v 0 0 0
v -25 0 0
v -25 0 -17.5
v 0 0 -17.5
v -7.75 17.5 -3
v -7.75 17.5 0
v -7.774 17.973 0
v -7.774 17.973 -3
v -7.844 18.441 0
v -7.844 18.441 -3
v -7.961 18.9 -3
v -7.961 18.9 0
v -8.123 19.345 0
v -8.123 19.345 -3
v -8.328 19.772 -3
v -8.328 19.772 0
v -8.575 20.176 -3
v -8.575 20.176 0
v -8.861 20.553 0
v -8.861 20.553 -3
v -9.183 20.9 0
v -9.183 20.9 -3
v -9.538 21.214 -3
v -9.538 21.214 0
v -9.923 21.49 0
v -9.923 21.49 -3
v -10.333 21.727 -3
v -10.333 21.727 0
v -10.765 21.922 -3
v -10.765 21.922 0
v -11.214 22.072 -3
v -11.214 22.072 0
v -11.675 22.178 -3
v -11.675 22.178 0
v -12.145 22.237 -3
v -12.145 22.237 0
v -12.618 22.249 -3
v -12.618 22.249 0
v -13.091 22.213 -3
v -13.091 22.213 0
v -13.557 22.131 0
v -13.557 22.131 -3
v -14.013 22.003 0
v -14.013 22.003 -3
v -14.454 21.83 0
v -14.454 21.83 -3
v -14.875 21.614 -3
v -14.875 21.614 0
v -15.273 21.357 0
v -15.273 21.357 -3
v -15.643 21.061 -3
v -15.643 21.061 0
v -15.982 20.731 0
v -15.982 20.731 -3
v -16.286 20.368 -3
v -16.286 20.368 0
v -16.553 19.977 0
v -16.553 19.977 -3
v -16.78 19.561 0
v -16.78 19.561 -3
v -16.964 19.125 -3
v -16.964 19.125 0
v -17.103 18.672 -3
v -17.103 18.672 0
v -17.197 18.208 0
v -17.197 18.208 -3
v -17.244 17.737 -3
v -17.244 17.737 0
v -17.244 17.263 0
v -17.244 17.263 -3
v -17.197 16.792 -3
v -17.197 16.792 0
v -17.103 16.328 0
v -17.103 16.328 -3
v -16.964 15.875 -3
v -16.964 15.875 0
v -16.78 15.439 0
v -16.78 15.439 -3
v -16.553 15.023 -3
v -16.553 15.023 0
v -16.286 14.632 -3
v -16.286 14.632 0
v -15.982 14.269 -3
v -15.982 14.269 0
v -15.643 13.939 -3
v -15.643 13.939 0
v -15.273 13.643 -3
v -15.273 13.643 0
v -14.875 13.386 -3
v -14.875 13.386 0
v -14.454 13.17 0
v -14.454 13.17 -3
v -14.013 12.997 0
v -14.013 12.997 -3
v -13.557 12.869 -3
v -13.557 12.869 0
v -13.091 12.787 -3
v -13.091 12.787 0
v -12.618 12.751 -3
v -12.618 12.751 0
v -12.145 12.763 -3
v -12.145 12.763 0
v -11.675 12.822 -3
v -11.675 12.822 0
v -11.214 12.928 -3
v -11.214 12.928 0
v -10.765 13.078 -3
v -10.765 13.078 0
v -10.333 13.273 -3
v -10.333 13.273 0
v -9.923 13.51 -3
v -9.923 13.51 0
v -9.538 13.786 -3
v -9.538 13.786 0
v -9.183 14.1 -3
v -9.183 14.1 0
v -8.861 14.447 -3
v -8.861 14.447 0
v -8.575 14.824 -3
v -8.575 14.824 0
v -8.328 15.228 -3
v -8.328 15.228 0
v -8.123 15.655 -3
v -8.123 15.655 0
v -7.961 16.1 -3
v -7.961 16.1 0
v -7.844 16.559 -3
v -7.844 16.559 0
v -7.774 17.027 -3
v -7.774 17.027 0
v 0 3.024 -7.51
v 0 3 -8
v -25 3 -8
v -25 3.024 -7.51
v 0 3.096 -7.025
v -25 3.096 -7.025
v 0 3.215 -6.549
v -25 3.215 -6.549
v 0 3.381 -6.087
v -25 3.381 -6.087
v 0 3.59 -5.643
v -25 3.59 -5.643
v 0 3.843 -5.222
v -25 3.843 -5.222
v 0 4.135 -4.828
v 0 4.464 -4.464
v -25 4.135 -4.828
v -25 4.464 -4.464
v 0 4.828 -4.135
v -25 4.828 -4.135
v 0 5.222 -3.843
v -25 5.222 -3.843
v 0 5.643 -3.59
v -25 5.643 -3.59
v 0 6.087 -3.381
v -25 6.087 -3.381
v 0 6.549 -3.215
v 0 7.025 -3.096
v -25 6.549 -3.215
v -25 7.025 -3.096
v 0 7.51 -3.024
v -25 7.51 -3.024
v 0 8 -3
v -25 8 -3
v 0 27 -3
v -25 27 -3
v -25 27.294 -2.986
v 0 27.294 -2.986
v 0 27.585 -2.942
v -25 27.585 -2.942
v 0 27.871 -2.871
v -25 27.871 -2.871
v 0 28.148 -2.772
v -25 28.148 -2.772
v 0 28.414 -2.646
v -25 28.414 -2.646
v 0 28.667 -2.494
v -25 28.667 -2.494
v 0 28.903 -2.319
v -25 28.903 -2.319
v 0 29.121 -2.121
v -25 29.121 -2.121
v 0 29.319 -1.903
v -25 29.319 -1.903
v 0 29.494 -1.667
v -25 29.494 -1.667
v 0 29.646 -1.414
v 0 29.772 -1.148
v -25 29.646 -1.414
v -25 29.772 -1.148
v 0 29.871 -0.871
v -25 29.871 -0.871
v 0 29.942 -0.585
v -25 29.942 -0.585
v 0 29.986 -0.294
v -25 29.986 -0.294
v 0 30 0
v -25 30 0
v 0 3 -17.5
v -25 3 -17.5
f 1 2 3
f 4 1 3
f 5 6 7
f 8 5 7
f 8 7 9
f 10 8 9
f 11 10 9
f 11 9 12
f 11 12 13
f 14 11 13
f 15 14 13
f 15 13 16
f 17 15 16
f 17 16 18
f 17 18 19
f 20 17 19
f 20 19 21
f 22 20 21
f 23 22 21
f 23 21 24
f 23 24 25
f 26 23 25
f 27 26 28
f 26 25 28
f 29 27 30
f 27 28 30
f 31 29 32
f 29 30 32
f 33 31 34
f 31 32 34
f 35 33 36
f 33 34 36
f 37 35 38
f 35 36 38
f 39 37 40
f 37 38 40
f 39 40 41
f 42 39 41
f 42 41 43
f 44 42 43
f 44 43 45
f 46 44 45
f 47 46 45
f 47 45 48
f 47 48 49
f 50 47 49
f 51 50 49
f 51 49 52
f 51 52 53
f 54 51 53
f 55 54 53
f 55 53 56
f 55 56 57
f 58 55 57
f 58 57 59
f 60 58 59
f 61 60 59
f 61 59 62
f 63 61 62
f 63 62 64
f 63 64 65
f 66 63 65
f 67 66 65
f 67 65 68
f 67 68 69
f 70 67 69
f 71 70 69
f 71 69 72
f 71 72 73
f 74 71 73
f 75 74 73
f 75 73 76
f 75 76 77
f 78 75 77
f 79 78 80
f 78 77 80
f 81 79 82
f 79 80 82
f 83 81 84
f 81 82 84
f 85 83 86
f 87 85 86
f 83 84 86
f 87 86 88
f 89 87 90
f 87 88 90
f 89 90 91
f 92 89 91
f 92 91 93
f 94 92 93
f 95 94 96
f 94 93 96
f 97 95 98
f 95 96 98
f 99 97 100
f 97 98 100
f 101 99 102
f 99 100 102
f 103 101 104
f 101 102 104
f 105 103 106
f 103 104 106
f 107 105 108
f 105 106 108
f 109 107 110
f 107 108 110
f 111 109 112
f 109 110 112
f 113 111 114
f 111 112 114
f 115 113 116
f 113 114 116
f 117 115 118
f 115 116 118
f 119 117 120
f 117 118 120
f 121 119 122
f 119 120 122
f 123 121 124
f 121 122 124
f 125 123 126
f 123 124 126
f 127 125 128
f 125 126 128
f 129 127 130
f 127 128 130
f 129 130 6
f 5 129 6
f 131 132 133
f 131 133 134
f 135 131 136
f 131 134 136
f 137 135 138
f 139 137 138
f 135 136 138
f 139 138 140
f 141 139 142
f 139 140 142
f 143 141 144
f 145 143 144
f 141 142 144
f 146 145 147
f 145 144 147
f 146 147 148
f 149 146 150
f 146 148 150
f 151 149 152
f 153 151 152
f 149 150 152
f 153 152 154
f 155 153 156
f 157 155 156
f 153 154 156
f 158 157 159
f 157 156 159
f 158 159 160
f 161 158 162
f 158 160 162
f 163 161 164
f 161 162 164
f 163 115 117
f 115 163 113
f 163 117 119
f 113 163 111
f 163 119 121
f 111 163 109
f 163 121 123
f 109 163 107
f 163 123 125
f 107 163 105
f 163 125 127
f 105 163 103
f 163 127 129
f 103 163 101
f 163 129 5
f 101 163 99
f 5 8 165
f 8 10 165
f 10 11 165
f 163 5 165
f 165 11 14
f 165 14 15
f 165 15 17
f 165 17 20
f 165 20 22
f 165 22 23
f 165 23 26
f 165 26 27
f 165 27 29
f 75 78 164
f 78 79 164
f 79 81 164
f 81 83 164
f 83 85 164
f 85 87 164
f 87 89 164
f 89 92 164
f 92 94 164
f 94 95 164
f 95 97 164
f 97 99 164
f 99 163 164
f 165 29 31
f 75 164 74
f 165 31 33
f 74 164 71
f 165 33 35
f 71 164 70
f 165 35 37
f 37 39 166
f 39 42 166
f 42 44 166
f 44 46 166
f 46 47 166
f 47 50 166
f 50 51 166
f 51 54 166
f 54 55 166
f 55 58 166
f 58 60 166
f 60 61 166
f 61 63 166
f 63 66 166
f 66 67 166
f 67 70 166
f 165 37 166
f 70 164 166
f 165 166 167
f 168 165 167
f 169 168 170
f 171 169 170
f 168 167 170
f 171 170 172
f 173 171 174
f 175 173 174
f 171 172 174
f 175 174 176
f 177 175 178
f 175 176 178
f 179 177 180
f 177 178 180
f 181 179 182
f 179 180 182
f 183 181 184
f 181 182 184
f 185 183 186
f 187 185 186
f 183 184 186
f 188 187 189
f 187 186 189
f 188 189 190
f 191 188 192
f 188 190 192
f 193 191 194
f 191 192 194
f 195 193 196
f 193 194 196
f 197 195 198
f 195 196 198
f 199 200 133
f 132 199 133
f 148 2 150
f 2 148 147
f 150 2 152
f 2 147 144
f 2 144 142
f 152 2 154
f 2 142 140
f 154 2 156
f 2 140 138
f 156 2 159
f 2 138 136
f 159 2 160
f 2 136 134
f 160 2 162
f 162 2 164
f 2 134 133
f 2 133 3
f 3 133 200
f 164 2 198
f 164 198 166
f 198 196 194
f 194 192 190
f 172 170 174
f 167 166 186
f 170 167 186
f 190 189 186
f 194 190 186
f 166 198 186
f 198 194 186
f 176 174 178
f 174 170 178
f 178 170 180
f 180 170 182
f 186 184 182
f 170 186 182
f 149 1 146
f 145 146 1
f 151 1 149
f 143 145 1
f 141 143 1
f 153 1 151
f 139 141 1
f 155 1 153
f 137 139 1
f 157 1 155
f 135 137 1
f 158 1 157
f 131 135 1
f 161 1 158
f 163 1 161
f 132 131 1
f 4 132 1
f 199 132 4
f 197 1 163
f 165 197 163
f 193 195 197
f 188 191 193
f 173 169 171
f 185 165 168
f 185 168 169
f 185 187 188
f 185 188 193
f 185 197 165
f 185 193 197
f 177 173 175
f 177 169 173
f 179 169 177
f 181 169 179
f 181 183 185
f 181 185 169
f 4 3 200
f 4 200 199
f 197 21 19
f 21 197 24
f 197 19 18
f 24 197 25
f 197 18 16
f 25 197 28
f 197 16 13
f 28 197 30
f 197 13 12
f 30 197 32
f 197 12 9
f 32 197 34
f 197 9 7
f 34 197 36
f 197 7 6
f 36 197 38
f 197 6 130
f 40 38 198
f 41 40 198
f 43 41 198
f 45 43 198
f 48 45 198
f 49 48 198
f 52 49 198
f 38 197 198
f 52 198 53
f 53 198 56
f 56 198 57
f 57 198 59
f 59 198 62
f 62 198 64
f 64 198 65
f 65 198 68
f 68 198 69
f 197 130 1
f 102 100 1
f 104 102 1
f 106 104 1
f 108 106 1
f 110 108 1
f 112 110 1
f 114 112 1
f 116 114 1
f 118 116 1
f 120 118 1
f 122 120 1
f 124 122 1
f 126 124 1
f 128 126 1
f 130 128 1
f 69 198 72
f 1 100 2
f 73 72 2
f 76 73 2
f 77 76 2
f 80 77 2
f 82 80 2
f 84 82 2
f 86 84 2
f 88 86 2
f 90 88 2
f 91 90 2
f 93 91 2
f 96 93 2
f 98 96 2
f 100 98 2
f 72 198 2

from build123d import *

# Parameters (mm, degrees)
L_ANGLE_EQUAL_30X30X3_2_DEPTH  = 25
F_9_5_9_5_DIAMETER_HOLE1_D     = 9.5
F_9_5_9_5_DIAMETER_HOLE1_DEPTH = 18
F_9_5_9_5_DIAMETER_HOLE1_TIP   = 2.85408794
CUT_EXTRUDE1_REACH             = 51.244
SKETCH15_W                     = 25
SKETCH15_H                     = 12.5


with BuildPart() as part:
    # Sketch19 → L angle (equal) 30X30X3(2) (new body)
    with BuildSketch(Plane(origin=(-25, 0, 0), x_dir=(0, 0, -1), z_dir=(1, 0, 0))):
        with BuildLine():
            Line((0, 30), (0, 0))
            Line((0, 0), (30, 0))
            ThreePointArc((30, 0), (29.121320344, 2.121320344), (27, 3))
            Line((27, 3), (8, 3))
            ThreePointArc((8, 3), (4.464466094, 4.464466094), (3, 8))
            Line((3, 8), (3, 27))
            ThreePointArc((3, 27), (2.121320344, 29.121320344), (0, 30))
        make_face()
    extrude(amount=L_ANGLE_EQUAL_30X30X3_2_DEPTH)

    # Ø9.5 (9.5) Diameter Hole1
    with Locations(Plane(origin=(0, 0, -3), x_dir=(-1, 0, 0), z_dir=(0, 0, -1))):
        with Locations((12.5, 17.5)):
            Hole(F_9_5_9_5_DIAMETER_HOLE1_D / 2, depth=F_9_5_9_5_DIAMETER_HOLE1_DEPTH)
            with Locations((0, 0, -(F_9_5_9_5_DIAMETER_HOLE1_DEPTH + F_9_5_9_5_DIAMETER_HOLE1_TIP / 2))):  # 118° drill point
                Cone(0, F_9_5_9_5_DIAMETER_HOLE1_D / 2, F_9_5_9_5_DIAMETER_HOLE1_TIP, mode=Mode.SUBTRACT)

    # Sketch15 → Cut-Extrude1 (cut, up to next)
    with BuildSketch(Plane.XZ, mode=Mode.PRIVATE) as cut_extrude1_sk1:
        with Locations((-12.5, -23.75)):
            Rectangle(SKETCH15_W, SKETCH15_H)
    cut_extrude1_tool1 = extrude(cut_extrude1_sk1.sketch, amount=-CUT_EXTRUDE1_REACH, mode=Mode.PRIVATE) & part.part
    add(cut_extrude1_tool1.solids().sort_by_distance((-12.5, 0, -23.75))[0], mode=Mode.SUBTRACT)


solid = part.part
